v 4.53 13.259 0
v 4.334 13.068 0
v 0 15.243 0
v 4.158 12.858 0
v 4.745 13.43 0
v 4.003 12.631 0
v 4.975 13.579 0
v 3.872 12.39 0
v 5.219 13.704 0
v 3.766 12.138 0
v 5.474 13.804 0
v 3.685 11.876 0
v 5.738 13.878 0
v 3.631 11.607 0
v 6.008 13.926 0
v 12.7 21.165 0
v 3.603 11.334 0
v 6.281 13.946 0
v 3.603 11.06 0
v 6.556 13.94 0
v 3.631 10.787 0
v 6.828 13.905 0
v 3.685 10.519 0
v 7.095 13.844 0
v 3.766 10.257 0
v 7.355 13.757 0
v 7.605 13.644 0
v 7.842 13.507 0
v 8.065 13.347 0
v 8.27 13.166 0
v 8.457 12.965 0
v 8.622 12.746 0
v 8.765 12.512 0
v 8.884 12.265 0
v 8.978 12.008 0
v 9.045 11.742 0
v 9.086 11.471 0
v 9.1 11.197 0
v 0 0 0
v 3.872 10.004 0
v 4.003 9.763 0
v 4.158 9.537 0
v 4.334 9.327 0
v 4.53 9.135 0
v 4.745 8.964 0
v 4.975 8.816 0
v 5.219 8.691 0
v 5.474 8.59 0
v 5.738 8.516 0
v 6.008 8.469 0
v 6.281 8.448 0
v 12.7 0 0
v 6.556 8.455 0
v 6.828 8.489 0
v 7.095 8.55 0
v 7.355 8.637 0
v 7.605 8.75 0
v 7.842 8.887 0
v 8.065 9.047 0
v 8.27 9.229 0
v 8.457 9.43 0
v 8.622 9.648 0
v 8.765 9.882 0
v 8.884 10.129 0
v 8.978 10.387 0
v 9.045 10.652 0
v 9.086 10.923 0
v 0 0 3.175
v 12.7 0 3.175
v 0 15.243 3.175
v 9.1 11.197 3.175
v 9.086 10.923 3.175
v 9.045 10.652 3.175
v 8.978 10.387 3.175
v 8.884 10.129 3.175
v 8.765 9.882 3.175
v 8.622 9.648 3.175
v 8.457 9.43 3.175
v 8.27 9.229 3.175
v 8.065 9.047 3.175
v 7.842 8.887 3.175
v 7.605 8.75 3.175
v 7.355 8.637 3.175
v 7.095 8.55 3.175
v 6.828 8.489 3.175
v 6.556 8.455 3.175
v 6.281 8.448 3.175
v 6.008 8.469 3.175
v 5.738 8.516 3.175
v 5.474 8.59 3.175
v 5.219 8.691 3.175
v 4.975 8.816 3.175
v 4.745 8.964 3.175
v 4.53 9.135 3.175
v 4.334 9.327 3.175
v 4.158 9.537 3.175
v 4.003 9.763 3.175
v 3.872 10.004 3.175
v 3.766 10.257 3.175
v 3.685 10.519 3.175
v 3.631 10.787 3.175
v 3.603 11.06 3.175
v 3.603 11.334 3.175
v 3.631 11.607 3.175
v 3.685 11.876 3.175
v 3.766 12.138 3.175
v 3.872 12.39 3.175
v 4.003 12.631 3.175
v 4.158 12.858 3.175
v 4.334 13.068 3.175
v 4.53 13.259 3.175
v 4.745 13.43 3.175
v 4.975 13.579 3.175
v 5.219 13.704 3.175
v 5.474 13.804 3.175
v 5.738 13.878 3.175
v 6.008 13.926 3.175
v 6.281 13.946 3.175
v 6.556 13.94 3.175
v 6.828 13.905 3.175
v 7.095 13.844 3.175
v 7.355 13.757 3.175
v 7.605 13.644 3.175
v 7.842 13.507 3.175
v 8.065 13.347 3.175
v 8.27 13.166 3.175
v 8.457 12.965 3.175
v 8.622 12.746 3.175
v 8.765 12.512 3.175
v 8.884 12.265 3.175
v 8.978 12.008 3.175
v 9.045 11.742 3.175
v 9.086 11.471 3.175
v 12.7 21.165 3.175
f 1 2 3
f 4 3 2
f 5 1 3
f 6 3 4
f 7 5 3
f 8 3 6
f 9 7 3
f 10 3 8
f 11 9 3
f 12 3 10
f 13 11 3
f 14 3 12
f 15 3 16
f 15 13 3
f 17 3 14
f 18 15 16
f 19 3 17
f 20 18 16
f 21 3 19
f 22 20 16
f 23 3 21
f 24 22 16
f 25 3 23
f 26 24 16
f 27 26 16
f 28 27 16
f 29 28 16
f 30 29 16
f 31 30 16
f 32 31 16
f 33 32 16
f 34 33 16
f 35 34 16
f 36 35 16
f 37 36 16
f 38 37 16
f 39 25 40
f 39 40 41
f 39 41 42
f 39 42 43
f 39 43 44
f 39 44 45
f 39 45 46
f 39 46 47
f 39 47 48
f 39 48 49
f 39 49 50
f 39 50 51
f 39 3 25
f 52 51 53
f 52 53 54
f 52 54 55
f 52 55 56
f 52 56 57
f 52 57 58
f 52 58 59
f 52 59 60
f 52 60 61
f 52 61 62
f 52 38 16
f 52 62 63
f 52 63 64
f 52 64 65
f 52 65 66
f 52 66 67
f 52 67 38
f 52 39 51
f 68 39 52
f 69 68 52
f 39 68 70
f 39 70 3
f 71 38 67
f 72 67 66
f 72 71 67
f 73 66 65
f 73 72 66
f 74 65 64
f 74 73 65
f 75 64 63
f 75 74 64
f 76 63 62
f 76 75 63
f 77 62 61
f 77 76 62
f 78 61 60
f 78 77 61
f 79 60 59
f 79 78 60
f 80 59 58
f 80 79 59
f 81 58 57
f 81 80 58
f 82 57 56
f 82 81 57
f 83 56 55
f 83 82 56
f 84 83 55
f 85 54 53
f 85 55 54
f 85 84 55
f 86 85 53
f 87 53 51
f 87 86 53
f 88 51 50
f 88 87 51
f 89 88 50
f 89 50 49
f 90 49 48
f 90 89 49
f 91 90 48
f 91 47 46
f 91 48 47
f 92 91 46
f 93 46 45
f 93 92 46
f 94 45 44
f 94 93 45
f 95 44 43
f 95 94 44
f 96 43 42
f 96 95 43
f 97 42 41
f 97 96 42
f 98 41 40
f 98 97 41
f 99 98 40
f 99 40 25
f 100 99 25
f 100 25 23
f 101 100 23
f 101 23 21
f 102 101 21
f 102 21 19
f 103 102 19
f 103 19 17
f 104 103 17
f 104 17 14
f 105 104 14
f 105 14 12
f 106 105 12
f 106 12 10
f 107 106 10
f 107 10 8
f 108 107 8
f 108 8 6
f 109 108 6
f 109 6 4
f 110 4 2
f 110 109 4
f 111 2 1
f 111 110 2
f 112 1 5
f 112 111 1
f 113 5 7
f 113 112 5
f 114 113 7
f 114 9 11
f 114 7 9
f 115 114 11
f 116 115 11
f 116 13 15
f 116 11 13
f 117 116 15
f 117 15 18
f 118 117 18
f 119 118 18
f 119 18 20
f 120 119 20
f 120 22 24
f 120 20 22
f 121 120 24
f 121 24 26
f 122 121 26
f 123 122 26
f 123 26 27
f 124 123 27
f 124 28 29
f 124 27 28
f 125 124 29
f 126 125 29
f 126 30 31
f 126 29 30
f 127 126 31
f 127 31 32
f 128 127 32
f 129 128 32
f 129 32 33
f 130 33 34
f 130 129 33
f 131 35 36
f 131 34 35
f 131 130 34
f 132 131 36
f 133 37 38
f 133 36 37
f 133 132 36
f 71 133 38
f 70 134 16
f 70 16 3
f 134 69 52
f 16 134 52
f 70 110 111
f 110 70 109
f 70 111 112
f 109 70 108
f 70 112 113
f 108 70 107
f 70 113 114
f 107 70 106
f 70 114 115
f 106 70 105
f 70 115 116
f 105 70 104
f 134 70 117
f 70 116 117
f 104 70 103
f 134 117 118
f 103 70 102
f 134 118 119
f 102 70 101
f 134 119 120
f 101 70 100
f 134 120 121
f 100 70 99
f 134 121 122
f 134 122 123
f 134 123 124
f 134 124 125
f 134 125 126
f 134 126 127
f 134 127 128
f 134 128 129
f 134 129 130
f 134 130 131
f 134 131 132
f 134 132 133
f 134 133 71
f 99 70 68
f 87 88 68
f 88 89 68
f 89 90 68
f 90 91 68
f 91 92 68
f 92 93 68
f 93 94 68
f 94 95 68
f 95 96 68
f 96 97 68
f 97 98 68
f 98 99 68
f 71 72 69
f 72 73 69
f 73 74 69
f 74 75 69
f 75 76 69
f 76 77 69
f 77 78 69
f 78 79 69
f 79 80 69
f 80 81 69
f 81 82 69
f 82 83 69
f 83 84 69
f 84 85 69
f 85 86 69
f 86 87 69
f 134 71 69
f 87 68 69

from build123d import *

# Parameters (mm, degrees)
SKETCH2_W           = 12.7
SKETCH2_H           = 3.175
BOSS_EXTRUDE1_DEPTH = 63.5
CUT_EXTRUDE1_REACH  = 66.835
SKETCH3_R           = 2.75


with BuildPart() as part:
    # Sketch2 → Boss-Extrude1 (new body)
    with BuildSketch(Plane(origin=(0, 0, 0), x_dir=(1, 0, 0), z_dir=(0, 1, 0))):
        with Locations((6.35, -1.5875)):
            Rectangle(SKETCH2_W, SKETCH2_H)
    extrude(amount=BOSS_EXTRUDE1_DEPTH)

    # Sketch3 → Cut-Extrude1 (cut, up to next)
    with BuildSketch(Plane(origin=(0, 0, 3.175), x_dir=(-1, 0, 0), z_dir=(0, 0, -1)), mode=Mode.PRIVATE) as cut_extrude1_sk1:
        with Locations(Location((-6.35, 11.197261172, 0), (0, 0, 180))):
            Circle(SKETCH3_R)
    cut_extrude1_tool1 = extrude(cut_extrude1_sk1.sketch, amount=CUT_EXTRUDE1_REACH, mode=Mode.PRIVATE) & part.part
    # Sketch3 → Cut-Extrude1 (cut, up to next)
    with BuildSketch(Plane(origin=(0, 0, 3.175), x_dir=(-1, 0, 0), z_dir=(0, 0, -1)), mode=Mode.PRIVATE) as cut_extrude1_sk2:
        Polygon((-12.7, 21.164764587), (0, 15.242657328), (0, 63.5), (-12.7, 63.5), align=None)
    cut_extrude1_tool2 = extrude(cut_extrude1_sk2.sketch, amount=CUT_EXTRUDE1_REACH, mode=Mode.PRIVATE) & part.part
    add(cut_extrude1_tool1.solids().sort_by_distance((6.35, 11.197261, 3.175))[0], mode=Mode.SUBTRACT)
    add(cut_extrude1_tool2.solids().sort_by_distance((6.211632, 40.819594, 3.175))[0], mode=Mode.SUBTRACT)


solid = part.part
